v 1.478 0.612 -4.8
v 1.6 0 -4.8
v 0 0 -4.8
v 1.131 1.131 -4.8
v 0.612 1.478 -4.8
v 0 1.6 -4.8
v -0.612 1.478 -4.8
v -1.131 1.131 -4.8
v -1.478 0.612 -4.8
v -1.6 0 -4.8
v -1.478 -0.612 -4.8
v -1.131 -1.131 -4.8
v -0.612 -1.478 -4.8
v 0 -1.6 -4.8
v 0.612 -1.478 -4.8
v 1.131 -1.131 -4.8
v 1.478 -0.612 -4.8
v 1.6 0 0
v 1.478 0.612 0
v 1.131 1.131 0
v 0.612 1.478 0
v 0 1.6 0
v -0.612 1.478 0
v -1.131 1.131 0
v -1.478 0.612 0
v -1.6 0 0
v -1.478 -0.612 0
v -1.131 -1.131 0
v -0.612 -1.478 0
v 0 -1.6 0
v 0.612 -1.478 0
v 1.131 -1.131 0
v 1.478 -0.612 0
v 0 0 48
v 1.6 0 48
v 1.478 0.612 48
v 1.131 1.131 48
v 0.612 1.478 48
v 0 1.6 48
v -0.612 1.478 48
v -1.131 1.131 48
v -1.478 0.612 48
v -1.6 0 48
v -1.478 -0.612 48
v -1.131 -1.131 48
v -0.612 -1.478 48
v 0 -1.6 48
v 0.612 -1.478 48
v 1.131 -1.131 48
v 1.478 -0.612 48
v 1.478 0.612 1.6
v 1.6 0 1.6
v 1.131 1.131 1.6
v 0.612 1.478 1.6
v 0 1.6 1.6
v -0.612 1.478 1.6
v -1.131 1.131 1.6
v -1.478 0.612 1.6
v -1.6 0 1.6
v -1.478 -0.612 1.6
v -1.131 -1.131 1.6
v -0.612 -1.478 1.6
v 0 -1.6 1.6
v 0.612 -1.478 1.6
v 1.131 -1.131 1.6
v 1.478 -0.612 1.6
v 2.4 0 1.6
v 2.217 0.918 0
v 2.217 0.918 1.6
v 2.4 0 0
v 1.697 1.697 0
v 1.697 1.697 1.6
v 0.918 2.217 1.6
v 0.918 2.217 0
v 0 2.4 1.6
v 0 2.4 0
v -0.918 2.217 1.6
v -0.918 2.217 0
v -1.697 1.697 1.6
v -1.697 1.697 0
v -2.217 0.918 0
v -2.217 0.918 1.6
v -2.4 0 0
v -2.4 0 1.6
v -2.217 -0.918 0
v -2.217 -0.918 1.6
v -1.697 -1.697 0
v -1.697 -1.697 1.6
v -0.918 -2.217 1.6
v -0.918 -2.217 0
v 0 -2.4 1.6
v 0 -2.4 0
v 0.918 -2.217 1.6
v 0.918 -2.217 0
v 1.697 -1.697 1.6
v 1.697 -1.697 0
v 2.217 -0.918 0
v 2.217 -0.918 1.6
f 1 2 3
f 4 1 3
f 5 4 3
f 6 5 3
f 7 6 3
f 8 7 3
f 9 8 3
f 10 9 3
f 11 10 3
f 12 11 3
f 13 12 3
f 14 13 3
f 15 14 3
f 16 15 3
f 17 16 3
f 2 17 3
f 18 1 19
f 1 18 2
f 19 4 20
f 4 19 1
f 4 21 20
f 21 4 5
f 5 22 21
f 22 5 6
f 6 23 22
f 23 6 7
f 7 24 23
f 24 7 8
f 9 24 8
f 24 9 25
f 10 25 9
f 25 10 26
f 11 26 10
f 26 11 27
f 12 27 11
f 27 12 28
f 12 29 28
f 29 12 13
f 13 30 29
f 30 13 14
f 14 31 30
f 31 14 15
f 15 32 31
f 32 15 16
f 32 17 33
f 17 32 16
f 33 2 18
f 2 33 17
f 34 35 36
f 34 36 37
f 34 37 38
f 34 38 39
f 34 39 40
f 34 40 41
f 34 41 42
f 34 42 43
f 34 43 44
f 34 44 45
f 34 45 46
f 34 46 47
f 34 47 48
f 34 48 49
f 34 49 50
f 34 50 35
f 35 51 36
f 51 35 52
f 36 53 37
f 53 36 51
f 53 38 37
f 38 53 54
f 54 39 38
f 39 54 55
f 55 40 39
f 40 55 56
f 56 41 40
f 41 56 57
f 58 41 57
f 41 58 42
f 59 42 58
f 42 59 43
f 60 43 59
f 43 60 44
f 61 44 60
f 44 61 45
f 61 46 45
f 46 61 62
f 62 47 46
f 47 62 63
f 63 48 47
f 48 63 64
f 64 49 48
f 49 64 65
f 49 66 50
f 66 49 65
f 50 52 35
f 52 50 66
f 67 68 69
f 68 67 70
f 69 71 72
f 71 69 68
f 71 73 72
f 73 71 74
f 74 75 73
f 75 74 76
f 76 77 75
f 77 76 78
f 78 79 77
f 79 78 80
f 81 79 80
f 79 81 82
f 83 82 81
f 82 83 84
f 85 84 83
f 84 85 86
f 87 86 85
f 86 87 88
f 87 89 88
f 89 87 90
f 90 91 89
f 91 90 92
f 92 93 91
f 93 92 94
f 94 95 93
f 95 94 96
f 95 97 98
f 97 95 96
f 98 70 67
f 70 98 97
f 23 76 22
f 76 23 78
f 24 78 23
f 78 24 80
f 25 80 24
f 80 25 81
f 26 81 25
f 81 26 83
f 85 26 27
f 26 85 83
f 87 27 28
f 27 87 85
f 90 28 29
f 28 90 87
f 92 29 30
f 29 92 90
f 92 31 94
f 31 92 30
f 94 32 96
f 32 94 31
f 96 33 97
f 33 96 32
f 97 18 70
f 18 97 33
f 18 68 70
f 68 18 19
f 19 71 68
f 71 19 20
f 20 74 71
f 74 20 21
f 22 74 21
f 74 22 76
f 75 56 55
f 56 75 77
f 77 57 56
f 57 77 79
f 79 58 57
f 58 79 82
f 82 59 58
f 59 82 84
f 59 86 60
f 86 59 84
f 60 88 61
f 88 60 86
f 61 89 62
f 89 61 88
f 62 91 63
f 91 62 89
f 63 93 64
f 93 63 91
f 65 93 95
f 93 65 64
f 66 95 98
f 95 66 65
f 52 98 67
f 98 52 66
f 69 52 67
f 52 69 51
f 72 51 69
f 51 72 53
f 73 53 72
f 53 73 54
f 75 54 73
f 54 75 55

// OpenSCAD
// file: ../p/4-4edge.scad
use <../lib.scad>
function ldraw_lib__4_4edge() = [
// 0 Circle 1.0
// 0 Name: 4-4edge.dat
// 0 Author: James Jessiman
// 0 !LDRAW_ORG Primitive UPDATE 2017-01
// 0 !LICENSE Licensed under CC BY 2.0 and CC BY 4.0 : see CAreadme.txt
// 
// 0 BFC CERTIFY CCW
  [0,"BFC","CERTIFY"],
  [0,"BFC","CCW"],
// 
// 0 !HISTORY 1998-12-15 [PTadmin] Official Update 1998-10
// 0 !HISTORY 2005-12-28 [PTadmin] Official Update 2005-01
// 0 !HISTORY 2007-06-24 [PTadmin] Header formatted for Contributor Agreement
// 0 !HISTORY 2008-07-01 [PTadmin] Official Update 2008-01
// 0 !HISTORY 2017-01-15 [Steffen] BFCed
// 0 !HISTORY 2017-12-30 [PTadmin] Official Update 2017-01
// 
// 
// 2 24 1 0 0 0.9239 0 0.3827
  [2,24,1,0,0,0.9239,0,0.3827],
// 2 24 0.9239 0 0.3827 0.7071 0 0.7071
  [2,24,0.9239,0,0.3827,0.7071,0,0.7071],
// 2 24 0.7071 0 0.7071 0.3827 0 0.9239
  [2,24,0.7071,0,0.7071,0.3827,0,0.9239],
// 2 24 0.3827 0 0.9239 0 0 1
  [2,24,0.3827,0,0.9239,0,0,1],
// 2 24 0 0 1 -0.3827 0 0.9239
  [2,24,0,0,1,-0.3827,0,0.9239],
// 2 24 -0.3827 0 0.9239 -0.7071 0 0.7071
  [2,24,-0.3827,0,0.9239,-0.7071,0,0.7071],
// 2 24 -0.7071 0 0.7071 -0.9239 0 0.3827
  [2,24,-0.7071,0,0.7071,-0.9239,0,0.3827],
// 2 24 -0.9239 0 0.3827 -1 0 -0
  [2,24,-0.9239,0,0.3827,-1,0,-0],
// 2 24 -1 0 -0 -0.9239 0 -0.3827
  [2,24,-1,0,-0,-0.9239,0,-0.3827],
// 2 24 -0.9239 0 -0.3827 -0.7071 0 -0.7071
  [2,24,-0.9239,0,-0.3827,-0.7071,0,-0.7071],
// 2 24 -0.7071 0 -0.7071 -0.3827 0 -0.9239
  [2,24,-0.7071,0,-0.7071,-0.3827,0,-0.9239],
// 2 24 -0.3827 0 -0.9239 0 0 -1
  [2,24,-0.3827,0,-0.9239,0,0,-1],
// 2 24 0 0 -1 0.3827 0 -0.9239
  [2,24,0,0,-1,0.3827,0,-0.9239],
// 2 24 0.3827 0 -0.9239 0.7071 0 -0.7071
  [2,24,0.3827,0,-0.9239,0.7071,0,-0.7071],
// 2 24 0.7071 0 -0.7071 0.9239 0 -0.3827
  [2,24,0.7071,0,-0.7071,0.9239,0,-0.3827],
// 2 24 0.9239 0 -0.3827 1 0 0
  [2,24,0.9239,0,-0.3827,1,0,0],
];
makepoly(ldraw_lib__4_4edge(), line=0.2);
// file: ../p/4-4disc.scad
use <../lib.scad>
function ldraw_lib__4_4disc() = [
// 0 Disc 1.0
// 0 Name: 4-4disc.dat
// 0 Author: James Jessiman
// 0 !LDRAW_ORG Primitive UPDATE 2002-02
// 0 !LICENSE Licensed under CC BY 2.0 and CC BY 4.0 : see CAreadme.txt
// 
// 0 BFC CERTIFY CCW
  [0,"BFC","CERTIFY"],
  [0,"BFC","CCW"],
// 
// 0 !HISTORY 1998-12-15 [PTadmin] Official Update 1998-10
// 0 !HISTORY 2002-03-23 [sbliss] Added BFC statement
// 0 !HISTORY 2002-04-25 [PTadmin] Official Update 2002-02
// 0 !HISTORY 2007-06-24 [PTadmin] Header formatted for Contributor Agreement
// 0 !HISTORY 2008-07-01 [PTadmin] Official Update 2008-01
// 
// 
// 3 16 0 0 0 1 0 0 0.9239 0 0.3827
  [3,16,0,0,0,1,0,0,0.9239,0,0.3827],
// 3 16 0 0 0 0.9239 0 0.3827 0.7071 0 0.7071
  [3,16,0,0,0,0.9239,0,0.3827,0.7071,0,0.7071],
// 3 16 0 0 0 0.7071 0 0.7071 0.3827 0 0.9239
  [3,16,0,0,0,0.7071,0,0.7071,0.3827,0,0.9239],
// 3 16 0 0 0 0.3827 0 0.9239 0 0 1
  [3,16,0,0,0,0.3827,0,0.9239,0,0,1],
// 3 16 0 0 0 0 0 1 -0.3827 0 0.9239
  [3,16,0,0,0,0,0,1,-0.3827,0,0.9239],
// 3 16 0 0 0 -0.3827 0 0.9239 -0.7071 0 0.7071
  [3,16,0,0,0,-0.3827,0,0.9239,-0.7071,0,0.7071],
// 3 16 0 0 0 -0.7071 0 0.7071 -0.9239 0 0.3827
  [3,16,0,0,0,-0.7071,0,0.7071,-0.9239,0,0.3827],
// 3 16 0 0 0 -0.9239 0 0.3827 -1 0 -0
  [3,16,0,0,0,-0.9239,0,0.3827,-1,0,-0],
// 3 16 0 0 0 -1 0 -0 -0.9239 0 -0.3827
  [3,16,0,0,0,-1,0,-0,-0.9239,0,-0.3827],
// 3 16 0 0 0 -0.9239 0 -0.3827 -0.7071 0 -0.7071
  [3,16,0,0,0,-0.9239,0,-0.3827,-0.7071,0,-0.7071],
// 3 16 0 0 0 -0.7071 0 -0.7071 -0.3827 0 -0.9239
  [3,16,0,0,0,-0.7071,0,-0.7071,-0.3827,0,-0.9239],
// 3 16 0 0 0 -0.3827 0 -0.9239 0 0 -1
  [3,16,0,0,0,-0.3827,0,-0.9239,0,0,-1],
// 3 16 0 0 0 0 0 -1 0.3827 0 -0.9239
  [3,16,0,0,0,0,0,-1,0.3827,0,-0.9239],
// 3 16 0 0 0 0.3827 0 -0.9239 0.7071 0 -0.7071
  [3,16,0,0,0,0.3827,0,-0.9239,0.7071,0,-0.7071],
// 3 16 0 0 0 0.7071 0 -0.7071 0.9239 0 -0.3827
  [3,16,0,0,0,0.7071,0,-0.7071,0.9239,0,-0.3827],
// 3 16 0 0 0 0.9239 0 -0.3827 1 0 0
  [3,16,0,0,0,0.9239,0,-0.3827,1,0,0],
// 0
];
makepoly(ldraw_lib__4_4disc(), line=0.2);
// file: ../p/4-4cyli.scad
use <../lib.scad>
function ldraw_lib__4_4cyli() = [
// 0 Cylinder 1.0
// 0 Name: 4-4cyli.dat
// 0 Author: James Jessiman
// 0 !LDRAW_ORG Primitive UPDATE 2005-01
// 0 !LICENSE Licensed under CC BY 2.0 and CC BY 4.0 : see CAreadme.txt
// 
// 0 BFC CERTIFY CCW
  [0,"BFC","CERTIFY"],
  [0,"BFC","CCW"],
// 
// 0 !HISTORY 1998-12-15 [PTadmin] Official Update 1998-10
// 0 !HISTORY 2002-03-23 [sbliss] Added BFC statement; merged headers from files in distributions LDraw 0.27 and Complete.
// 0 !HISTORY 2002-04-25 [PTadmin] Official Update 2002-02
// 0 !HISTORY 2004-12-14 [guyvivan] BFC CCW
// 0 !HISTORY 2005-12-28 [PTadmin] Official Update 2005-01
// 0 !HISTORY 2007-06-24 [PTadmin] Header formatted for Contributor Agreement
// 0 !HISTORY 2008-07-01 [PTadmin] Official Update 2008-01
// 
// 
// 4 16 1 1 0 0.9239 1 0.3827 0.9239 0 0.3827 1 0 0
  [4,16,1,1,0,0.9239,1,0.3827,0.9239,0,0.3827,1,0,0],
// 5 24 1 0 0 1 1 0 0.9239 0 0.3827 0.9239 0 -0.3827
  [5,24,1,0,0,1,1,0,0.9239,0,0.3827,0.9239,0,-0.3827],
// 4 16 0.9239 1 0.3827 0.7071 1 0.7071 0.7071 0 0.7071 0.9239 0 0.3827
  [4,16,0.9239,1,0.3827,0.7071,1,0.7071,0.7071,0,0.7071,0.9239,0,0.3827],
// 5 24 0.9239 0 0.3827 0.9239 1 0.3827 0.7071 0 0.7071 1 0 0
  [5,24,0.9239,0,0.3827,0.9239,1,0.3827,0.7071,0,0.7071,1,0,0],
// 4 16 0.7071 1 0.7071 0.3827 1 0.9239 0.3827 0 0.9239 0.7071 0 0.7071
  [4,16,0.7071,1,0.7071,0.3827,1,0.9239,0.3827,0,0.9239,0.7071,0,0.7071],
// 5 24 0.7071 0 0.7071 0.7071 1 0.7071 0.3827 0 0.9239 0.9239 0 0.3827
  [5,24,0.7071,0,0.7071,0.7071,1,0.7071,0.3827,0,0.9239,0.9239,0,0.3827],
// 4 16 0.3827 1 0.9239 0 1 1 0 0 1 0.3827 0 0.9239
  [4,16,0.3827,1,0.9239,0,1,1,0,0,1,0.3827,0,0.9239],
// 5 24 0.3827 0 0.9239 0.3827 1 0.9239 0 0 1 0.7071 0 0.7071
  [5,24,0.3827,0,0.9239,0.3827,1,0.9239,0,0,1,0.7071,0,0.7071],
// 4 16 0 1 1 -0.3827 1 0.9239 -0.3827 0 0.9239 0 0 1
  [4,16,0,1,1,-0.3827,1,0.9239,-0.3827,0,0.9239,0,0,1],
// 5 24 0 0 1 0 1 1 -0.3827 0 0.9239 0.3827 0 0.9239
  [5,24,0,0,1,0,1,1,-0.3827,0,0.9239,0.3827,0,0.9239],
// 4 16 -0.3827 1 0.9239 -0.7071 1 0.7071 -0.7071 0 0.7071 -0.3827 0 0.9239
  [4,16,-0.3827,1,0.9239,-0.7071,1,0.7071,-0.7071,0,0.7071,-0.3827,0,0.9239],
// 5 24 -0.3827 0 0.9239 -0.3827 1 0.9239 -0.7071 0 0.7071 0 0 1
  [5,24,-0.3827,0,0.9239,-0.3827,1,0.9239,-0.7071,0,0.7071,0,0,1],
// 4 16 -0.7071 1 0.7071 -0.9239 1 0.3827 -0.9239 0 0.3827 -0.7071 0 0.7071
  [4,16,-0.7071,1,0.7071,-0.9239,1,0.3827,-0.9239,0,0.3827,-0.7071,0,0.7071],
// 5 24 -0.7071 0 0.7071 -0.7071 1 0.7071 -0.9239 0 0.3827 -0.3827 0 0.9239
  [5,24,-0.7071,0,0.7071,-0.7071,1,0.7071,-0.9239,0,0.3827,-0.3827,0,0.9239],
// 4 16 -0.9239 1 0.3827 -1 1 0 -1 0 0 -0.9239 0 0.3827
  [4,16,-0.9239,1,0.3827,-1,1,0,-1,0,0,-0.9239,0,0.3827],
// 5 24 -0.9239 0 0.3827 -0.9239 1 0.3827 -1 0 0 -0.7071 0 0.7071
  [5,24,-0.9239,0,0.3827,-0.9239,1,0.3827,-1,0,0,-0.7071,0,0.7071],
// 4 16 -1 1 0 -0.9239 1 -0.3827 -0.9239 0 -0.3827 -1 0 0
  [4,16,-1,1,0,-0.9239,1,-0.3827,-0.9239,0,-0.3827,-1,0,0],
// 5 24 -1 0 0 -1 1 0 -0.9239 0 -0.3827 -0.9239 0 0.3827
  [5,24,-1,0,0,-1,1,0,-0.9239,0,-0.3827,-0.9239,0,0.3827],
// 4 16 -0.9239 1 -0.3827 -0.7071 1 -0.7071 -0.7071 0 -0.7071 -0.9239 0 -0.3827
  [4,16,-0.9239,1,-0.3827,-0.7071,1,-0.7071,-0.7071,0,-0.7071,-0.9239,0,-0.3827],
// 5 24 -0.9239 0 -0.3827 -0.9239 1 -0.3827 -0.7071 0 -0.7071 -1 0 0
  [5,24,-0.9239,0,-0.3827,-0.9239,1,-0.3827,-0.7071,0,-0.7071,-1,0,0],
// 4 16 -0.7071 1 -0.7071 -0.3827 1 -0.9239 -0.3827 0 -0.9239 -0.7071 0 -0.7071
  [4,16,-0.7071,1,-0.7071,-0.3827,1,-0.9239,-0.3827,0,-0.9239,-0.7071,0,-0.7071],
// 5 24 -0.7071 0 -0.7071 -0.7071 1 -0.7071 -0.3827 0 -0.9239 -0.9239 0 -0.3827
  [5,24,-0.7071,0,-0.7071,-0.7071,1,-0.7071,-0.3827,0,-0.9239,-0.9239,0,-0.3827],
// 4 16 -0.3827 1 -0.9239 0 1 -1 0 0 -1 -0.3827 0 -0.9239
  [4,16,-0.3827,1,-0.9239,0,1,-1,0,0,-1,-0.3827,0,-0.9239],
// 5 24 -0.3827 0 -0.9239 -0.3827 1 -0.9239 0 0 -1 -0.7071 0 -0.7071
  [5,24,-0.3827,0,-0.9239,-0.3827,1,-0.9239,0,0,-1,-0.7071,0,-0.7071],
// 4 16 0 1 -1 0.3827 1 -0.9239 0.3827 0 -0.9239 0 0 -1
  [4,16,0,1,-1,0.3827,1,-0.9239,0.3827,0,-0.9239,0,0,-1],
// 5 24 0 0 -1 0 1 -1 0.3827 0 -0.9239 -0.3827 0 -0.9239
  [5,24,0,0,-1,0,1,-1,0.3827,0,-0.9239,-0.3827,0,-0.9239],
// 4 16 0.3827 1 -0.9239 0.7071 1 -0.7071 0.7071 0 -0.7071 0.3827 0 -0.9239
  [4,16,0.3827,1,-0.9239,0.7071,1,-0.7071,0.7071,0,-0.7071,0.3827,0,-0.9239],
// 5 24 0.3827 0 -0.9239 0.3827 1 -0.9239 0.7071 0 -0.7071 0 0 -1
  [5,24,0.3827,0,-0.9239,0.3827,1,-0.9239,0.7071,0,-0.7071,0,0,-1],
// 4 16 0.7071 1 -0.7071 0.9239 1 -0.3827 0.9239 0 -0.3827 0.7071 0 -0.7071
  [4,16,0.7071,1,-0.7071,0.9239,1,-0.3827,0.9239,0,-0.3827,0.7071,0,-0.7071],
// 5 24 0.7071 0 -0.7071 0.7071 1 -0.7071 0.9239 0 -0.3827 0.3827 0 -0.9239
  [5,24,0.7071,0,-0.7071,0.7071,1,-0.7071,0.9239,0,-0.3827,0.3827,0,-0.9239],
// 4 16 0.9239 1 -0.3827 1 1 0 1 0 0 0.9239 0 -0.3827
  [4,16,0.9239,1,-0.3827,1,1,0,1,0,0,0.9239,0,-0.3827],
// 5 24 0.9239 0 -0.3827 0.9239 1 -0.3827 1 0 0 0.7071 0 -0.7071
  [5,24,0.9239,0,-0.3827,0.9239,1,-0.3827,1,0,0,0.7071,0,-0.7071],
// 0
];
makepoly(ldraw_lib__4_4cyli(), line=0.2);
// file: ../p/4-4ring2.scad
use <../lib.scad>
function ldraw_lib__4_4ring2() = [
// 0 Ring  2 x 1.0
// 0 Name: 4-4ring2.dat
// 0 Author: James Jessiman
// 0 !LDRAW_ORG Primitive UPDATE 2009-01
// 0 !LICENSE Licensed under CC BY 2.0 and CC BY 4.0 : see CAreadme.txt
// 
// 0 BFC CERTIFY CCW
  [0,"BFC","CERTIFY"],
  [0,"BFC","CCW"],
// 
// 0 !HISTORY 1998-12-15 [PTadmin] Official Update 1998-10
// 0 !HISTORY 2002-04-05 [hafhead] Added BFC statement
// 0 !HISTORY 2002-04-25 [PTadmin] Official Update 2002-02
// 0 !HISTORY 2007-06-24 [PTadmin] Header formatted for Contributor Agreement
// 0 !HISTORY 2008-07-01 [PTadmin] Official Update 2008-01
// 0 !HISTORY 2008-08-26 [cwdee] Switch polygon winding and rename
// 0 !HISTORY 2009-05-02 [PTadmin] Official Update 2009-01
// 
// 
// 4 16 -1.1481 0 2.7717 -0.7654 0 1.8478 0 0 2 0 0 3
  [4,16,-1.1481,0,2.7717,-0.7654,0,1.8478,0,0,2,0,0,3],
// 4 16 -2.1213 0 2.1213 -1.4142 0 1.4142 -0.7654 0 1.8478 -1.1481 0 2.7717
  [4,16,-2.1213,0,2.1213,-1.4142,0,1.4142,-0.7654,0,1.8478,-1.1481,0,2.7717],
// 4 16 -2.7717 0 1.1481 -1.8478 0 0.7654 -1.4142 0 1.4142 -2.1213 0 2.1213
  [4,16,-2.7717,0,1.1481,-1.8478,0,0.7654,-1.4142,0,1.4142,-2.1213,0,2.1213],
// 4 16 -3 0 0 -2 0 0 -1.8478 0 0.7654 -2.7717 0 1.1481
  [4,16,-3,0,0,-2,0,0,-1.8478,0,0.7654,-2.7717,0,1.1481],
// 4 16 -2.7717 0 -1.1481 -1.8478 0 -0.7654 -2 0 0 -3 0 0
  [4,16,-2.7717,0,-1.1481,-1.8478,0,-0.7654,-2,0,0,-3,0,0],
// 4 16 -2.1213 0 -2.1213 -1.4142 0 -1.4142 -1.8478 0 -0.7654 -2.7717 0 -1.1481
  [4,16,-2.1213,0,-2.1213,-1.4142,0,-1.4142,-1.8478,0,-0.7654,-2.7717,0,-1.1481],
// 4 16 -1.1481 0 -2.7717 -0.7654 0 -1.8478 -1.4142 0 -1.4142 -2.1213 0 -2.1213
  [4,16,-1.1481,0,-2.7717,-0.7654,0,-1.8478,-1.4142,0,-1.4142,-2.1213,0,-2.1213],
// 4 16 0 0 -3 0 0 -2 -0.7654 0 -1.8478 -1.1481 0 -2.7717
  [4,16,0,0,-3,0,0,-2,-0.7654,0,-1.8478,-1.1481,0,-2.7717],
// 4 16 1.1481 0 -2.7717 0.7654 0 -1.8478 0 0 -2 0 0 -3
  [4,16,1.1481,0,-2.7717,0.7654,0,-1.8478,0,0,-2,0,0,-3],
// 4 16 2.1213 0 -2.1213 1.4142 0 -1.4142 0.7654 0 -1.8478 1.1481 0 -2.7717
  [4,16,2.1213,0,-2.1213,1.4142,0,-1.4142,0.7654,0,-1.8478,1.1481,0,-2.7717],
// 4 16 2.7717 0 -1.1481 1.8478 0 -0.7654 1.4142 0 -1.4142 2.1213 0 -2.1213
  [4,16,2.7717,0,-1.1481,1.8478,0,-0.7654,1.4142,0,-1.4142,2.1213,0,-2.1213],
// 4 16 3 0 0 2 0 0 1.8478 0 -0.7654 2.7717 0 -1.1481
  [4,16,3,0,0,2,0,0,1.8478,0,-0.7654,2.7717,0,-1.1481],
// 4 16 2.7717 0 1.1481 1.8478 0 0.7654 2 0 0 3 0 0
  [4,16,2.7717,0,1.1481,1.8478,0,0.7654,2,0,0,3,0,0],
// 4 16 2.1213 0 2.1213 1.4142 0 1.4142 1.8478 0 0.7654 2.7717 0 1.1481
  [4,16,2.1213,0,2.1213,1.4142,0,1.4142,1.8478,0,0.7654,2.7717,0,1.1481],
// 4 16 1.1481 0 2.7717 0.7654 0 1.8478 1.4142 0 1.4142 2.1213 0 2.1213
  [4,16,1.1481,0,2.7717,0.7654,0,1.8478,1.4142,0,1.4142,2.1213,0,2.1213],
// 4 16 0 0 3 0 0 2 0.7654 0 1.8478 1.1481 0 2.7717
  [4,16,0,0,3,0,0,2,0.7654,0,1.8478,1.1481,0,2.7717],
// 0
];
makepoly(ldraw_lib__4_4ring2(), line=0.2);
// file: ../p/4-4cylo.scad
use <../lib.scad>
use <4-4cyli.scad>
use <4-4edge.scad>
function ldraw_lib__4_4cylo() = [
// 0 Cylinder Open 1.0
// 0 Name: 4-4cylo.dat
// 0 Author: Mark Kennedy [mkennedy]
// 0 !LDRAW_ORG Primitive UPDATE 2010-01
// 0 !LICENSE Licensed under CC BY 2.0 and CC BY 4.0 : see CAreadme.txt
// 
// 0 BFC CERTIFY CCW
  [0,"BFC","CERTIFY"],
  [0,"BFC","CCW"],
// 
// 0 !HISTORY 2010-04-05 [PTadmin] Official Update 2010-01
// 
// 
// 1 16 0 0 0 1 0 0 0 1 0 0 0 1 4-4edge.dat
  [1,16,0,0,0,1,0,0,0,1,0,0,0,1, ldraw_lib__4_4edge()],
// 1 16 0 1 0 1 0 0 0 1 0 0 0 1 4-4edge.dat
  [1,16,0,1,0,1,0,0,0,1,0,0,0,1, ldraw_lib__4_4edge()],
// 1 16 0 0 0 1 0 0 0 1 0 0 0 1 4-4cyli.dat
  [1,16,0,0,0,1,0,0,0,1,0,0,0,1, ldraw_lib__4_4cyli()],
// 0
];
makepoly(ldraw_lib__4_4cylo(), line=0.2);
// file: ../p/4-4cylc.scad
use <../lib.scad>
use <4-4cyli.scad>
use <4-4disc.scad>
use <4-4edge.scad>
function ldraw_lib__4_4cylc() = [
// 0 Cylinder Closed 1.0
// 0 Name: 4-4cylc.dat
// 0 Author: Alex Taylor [anathema]
// 0 !LDRAW_ORG Primitive UPDATE 2009-02
// 0 !LICENSE Licensed under CC BY 2.0 and CC BY 4.0 : see CAreadme.txt
// 
// 0 BFC CERTIFY CCW
  [0,"BFC","CERTIFY"],
  [0,"BFC","CCW"],
// 
// 0 !HISTORY 2008-12-29 [cwdee] Removed one disc
// 0 !HISTORY 2009-09-03 [PTadmin] Official Update 2009-02
// 
// 
// 1 16 0 0 0 1 0 0 0 1 0 0 0 1 4-4edge.dat
  [1,16,0,0,0,1,0,0,0,1,0,0,0,1, ldraw_lib__4_4edge()],
// 1 16 0 1 0 1 0 0 0 1 0 0 0 1 4-4edge.dat
  [1,16,0,1,0,1,0,0,0,1,0,0,0,1, ldraw_lib__4_4edge()],
// 1 16 0 0 0 1 0 0 0 1 0 0 0 1 4-4disc.dat
  [1,16,0,0,0,1,0,0,0,1,0,0,0,1, ldraw_lib__4_4disc()],
// 1 16 0 0 0 1 0 0 0 1 0 0 0 1 4-4cyli.dat
  [1,16,0,0,0,1,0,0,0,1,0,0,0,1, ldraw_lib__4_4cyli()],
// 0
];
makepoly(ldraw_lib__4_4cylc(), line=0.2);
// main file
use <../lib.scad>
use <../p/4-4cylc.scad>
use <../p/4-4cylo.scad>
use <../p/4-4ring2.scad>
function ldraw_lib__4095() = [
// 0 Bar  6.6L with Stop
// 0 Name: 4095.dat
// 0 Author: James Jessiman
// 0 !LDRAW_ORG Part UPDATE 2010-03
// 0 !LICENSE Licensed under CC BY 2.0 and CC BY 4.0 : see CAreadme.txt
// 
// 0 BFC CERTIFY CCW
  [0,"BFC","CERTIFY"],
  [0,"BFC","CCW"],
// 
// 0 !KEYWORDS pole, rod, Small, stand, town, umbrella
// 
// 0 !HISTORY 2010-10-21 [westrate] CA rewrite; use cylc, cylo, and ring primitives
// 0 !HISTORY 2010-12-31 [PTadmin] Official Update 2010-03
// 
// 
// 1 16 0 12 0 4 0 0 0 -12 0 0 0 4 4-4cylc.dat
  [1,16,0,12,0,4,0,0,0,-12,0,0,0,4, ldraw_lib__4_4cylc()],
// 1 16 0 -120 0 4 0 0 0 116 0 0 0 4 4-4cylc.dat
  [1,16,0,-120,0,4,0,0,0,116,0,0,0,4, ldraw_lib__4_4cylc()],
// 1 16 0 0 0 6 0 0 0 -4 0 0 0 6 4-4cylo.dat
  [1,16,0,0,0,6,0,0,0,-4,0,0,0,6, ldraw_lib__4_4cylo()],
// 1 16 0 0 0 2 0 0 0 -1 0 0 0 2 4-4ring2.dat
  [1,16,0,0,0,2,0,0,0,-1,0,0,0,2, ldraw_lib__4_4ring2()],
// 1 16 0 -4 0 2 0 0 0 1 0 0 0 2 4-4ring2.dat
  [1,16,0,-4,0,2,0,0,0,1,0,0,0,2, ldraw_lib__4_4ring2()],
// 0
];
makepoly(ldraw_lib__4095(), line=0.2);
